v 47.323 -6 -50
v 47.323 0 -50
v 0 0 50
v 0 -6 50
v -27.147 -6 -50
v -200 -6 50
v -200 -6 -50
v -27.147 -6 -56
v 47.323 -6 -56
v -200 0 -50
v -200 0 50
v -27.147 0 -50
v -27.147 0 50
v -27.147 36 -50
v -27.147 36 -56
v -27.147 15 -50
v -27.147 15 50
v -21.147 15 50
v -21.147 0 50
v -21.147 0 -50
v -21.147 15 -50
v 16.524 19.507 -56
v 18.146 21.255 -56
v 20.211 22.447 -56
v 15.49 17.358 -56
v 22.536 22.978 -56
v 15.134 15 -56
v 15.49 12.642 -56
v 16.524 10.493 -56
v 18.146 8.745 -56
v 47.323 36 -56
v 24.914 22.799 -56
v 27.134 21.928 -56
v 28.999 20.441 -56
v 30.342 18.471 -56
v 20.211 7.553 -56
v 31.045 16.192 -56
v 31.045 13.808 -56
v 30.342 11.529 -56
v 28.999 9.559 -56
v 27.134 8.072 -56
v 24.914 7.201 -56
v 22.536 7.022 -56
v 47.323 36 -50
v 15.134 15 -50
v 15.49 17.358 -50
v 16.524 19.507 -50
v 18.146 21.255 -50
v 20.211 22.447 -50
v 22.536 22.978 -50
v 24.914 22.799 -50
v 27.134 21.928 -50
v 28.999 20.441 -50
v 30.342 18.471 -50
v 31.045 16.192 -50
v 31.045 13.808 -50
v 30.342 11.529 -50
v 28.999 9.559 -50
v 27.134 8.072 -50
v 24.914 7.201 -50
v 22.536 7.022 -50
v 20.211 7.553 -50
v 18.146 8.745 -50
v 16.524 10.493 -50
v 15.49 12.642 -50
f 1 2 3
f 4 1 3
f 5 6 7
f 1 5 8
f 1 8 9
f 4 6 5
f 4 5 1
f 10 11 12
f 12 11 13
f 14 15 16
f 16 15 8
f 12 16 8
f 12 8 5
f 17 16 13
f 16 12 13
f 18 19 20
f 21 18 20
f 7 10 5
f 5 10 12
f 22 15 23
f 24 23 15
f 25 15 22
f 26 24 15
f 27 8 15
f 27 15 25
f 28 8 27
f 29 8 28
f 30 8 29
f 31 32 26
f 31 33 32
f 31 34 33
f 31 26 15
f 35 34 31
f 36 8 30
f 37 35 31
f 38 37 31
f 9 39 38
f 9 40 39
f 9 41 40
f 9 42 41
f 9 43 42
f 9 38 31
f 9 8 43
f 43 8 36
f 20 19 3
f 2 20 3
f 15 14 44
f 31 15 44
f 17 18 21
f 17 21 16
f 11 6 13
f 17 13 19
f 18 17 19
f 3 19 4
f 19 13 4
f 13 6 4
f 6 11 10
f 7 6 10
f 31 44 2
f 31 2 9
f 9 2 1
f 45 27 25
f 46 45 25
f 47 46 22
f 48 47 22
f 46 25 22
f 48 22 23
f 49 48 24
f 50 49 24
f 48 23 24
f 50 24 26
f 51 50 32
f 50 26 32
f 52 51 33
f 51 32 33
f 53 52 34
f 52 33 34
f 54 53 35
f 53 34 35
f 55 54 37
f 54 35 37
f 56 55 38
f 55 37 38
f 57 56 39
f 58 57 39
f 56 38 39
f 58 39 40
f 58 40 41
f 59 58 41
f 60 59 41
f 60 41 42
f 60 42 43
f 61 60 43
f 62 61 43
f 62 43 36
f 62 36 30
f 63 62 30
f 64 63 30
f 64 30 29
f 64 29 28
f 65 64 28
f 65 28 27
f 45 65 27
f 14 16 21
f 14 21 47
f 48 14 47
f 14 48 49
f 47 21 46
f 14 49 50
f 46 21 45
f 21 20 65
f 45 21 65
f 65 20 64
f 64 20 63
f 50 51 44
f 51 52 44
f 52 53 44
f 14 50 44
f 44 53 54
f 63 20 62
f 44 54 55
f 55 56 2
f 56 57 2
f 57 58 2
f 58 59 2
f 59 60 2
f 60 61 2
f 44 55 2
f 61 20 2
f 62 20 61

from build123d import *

# Parameters (mm, degrees)
F1_DEPTH = 6
F2_W     = 74.469754
F2_H     = 42
F3_DEPTH = 6
F5_D     = 16
F7_DEPTH = 15


with BuildPart() as f1:
    # F0 (on Front) → F1 (new body)
    with BuildSketch(Plane.XZ):
        Polygon((0, 50), (-200, 50), (-200, -50), (0, -50), (47.323171, -50), align=None)
    extrude(amount=F1_DEPTH)

    # F2 (on face) → F3 (join)
    with BuildSketch(Plane(origin=(0, 0, -50), x_dir=(1, 0, 0), z_dir=(0, 0, -1))):
        with Locations((10.088294, -15)):
            Rectangle(F2_W, F2_H)
    extrude(amount=F3_DEPTH)

    # F5 (through all)
    with Locations(Plane.XY.offset(-50)):
        with Locations((23.134094, 15)):
            Hole(F5_D / 2)

    # F6 (on face) → F7 (join)
    with BuildSketch(Plane(origin=(0, 0, 0), x_dir=(-1, 0, 0), z_dir=(0, 1, 0))):
        Polygon((27.146583, 50), (21.146583, 50), (21.146583, -50), (25.706659, -50), (27.146583, -50), align=None)
    extrude(amount=F7_DEPTH)


solid = f1.part
